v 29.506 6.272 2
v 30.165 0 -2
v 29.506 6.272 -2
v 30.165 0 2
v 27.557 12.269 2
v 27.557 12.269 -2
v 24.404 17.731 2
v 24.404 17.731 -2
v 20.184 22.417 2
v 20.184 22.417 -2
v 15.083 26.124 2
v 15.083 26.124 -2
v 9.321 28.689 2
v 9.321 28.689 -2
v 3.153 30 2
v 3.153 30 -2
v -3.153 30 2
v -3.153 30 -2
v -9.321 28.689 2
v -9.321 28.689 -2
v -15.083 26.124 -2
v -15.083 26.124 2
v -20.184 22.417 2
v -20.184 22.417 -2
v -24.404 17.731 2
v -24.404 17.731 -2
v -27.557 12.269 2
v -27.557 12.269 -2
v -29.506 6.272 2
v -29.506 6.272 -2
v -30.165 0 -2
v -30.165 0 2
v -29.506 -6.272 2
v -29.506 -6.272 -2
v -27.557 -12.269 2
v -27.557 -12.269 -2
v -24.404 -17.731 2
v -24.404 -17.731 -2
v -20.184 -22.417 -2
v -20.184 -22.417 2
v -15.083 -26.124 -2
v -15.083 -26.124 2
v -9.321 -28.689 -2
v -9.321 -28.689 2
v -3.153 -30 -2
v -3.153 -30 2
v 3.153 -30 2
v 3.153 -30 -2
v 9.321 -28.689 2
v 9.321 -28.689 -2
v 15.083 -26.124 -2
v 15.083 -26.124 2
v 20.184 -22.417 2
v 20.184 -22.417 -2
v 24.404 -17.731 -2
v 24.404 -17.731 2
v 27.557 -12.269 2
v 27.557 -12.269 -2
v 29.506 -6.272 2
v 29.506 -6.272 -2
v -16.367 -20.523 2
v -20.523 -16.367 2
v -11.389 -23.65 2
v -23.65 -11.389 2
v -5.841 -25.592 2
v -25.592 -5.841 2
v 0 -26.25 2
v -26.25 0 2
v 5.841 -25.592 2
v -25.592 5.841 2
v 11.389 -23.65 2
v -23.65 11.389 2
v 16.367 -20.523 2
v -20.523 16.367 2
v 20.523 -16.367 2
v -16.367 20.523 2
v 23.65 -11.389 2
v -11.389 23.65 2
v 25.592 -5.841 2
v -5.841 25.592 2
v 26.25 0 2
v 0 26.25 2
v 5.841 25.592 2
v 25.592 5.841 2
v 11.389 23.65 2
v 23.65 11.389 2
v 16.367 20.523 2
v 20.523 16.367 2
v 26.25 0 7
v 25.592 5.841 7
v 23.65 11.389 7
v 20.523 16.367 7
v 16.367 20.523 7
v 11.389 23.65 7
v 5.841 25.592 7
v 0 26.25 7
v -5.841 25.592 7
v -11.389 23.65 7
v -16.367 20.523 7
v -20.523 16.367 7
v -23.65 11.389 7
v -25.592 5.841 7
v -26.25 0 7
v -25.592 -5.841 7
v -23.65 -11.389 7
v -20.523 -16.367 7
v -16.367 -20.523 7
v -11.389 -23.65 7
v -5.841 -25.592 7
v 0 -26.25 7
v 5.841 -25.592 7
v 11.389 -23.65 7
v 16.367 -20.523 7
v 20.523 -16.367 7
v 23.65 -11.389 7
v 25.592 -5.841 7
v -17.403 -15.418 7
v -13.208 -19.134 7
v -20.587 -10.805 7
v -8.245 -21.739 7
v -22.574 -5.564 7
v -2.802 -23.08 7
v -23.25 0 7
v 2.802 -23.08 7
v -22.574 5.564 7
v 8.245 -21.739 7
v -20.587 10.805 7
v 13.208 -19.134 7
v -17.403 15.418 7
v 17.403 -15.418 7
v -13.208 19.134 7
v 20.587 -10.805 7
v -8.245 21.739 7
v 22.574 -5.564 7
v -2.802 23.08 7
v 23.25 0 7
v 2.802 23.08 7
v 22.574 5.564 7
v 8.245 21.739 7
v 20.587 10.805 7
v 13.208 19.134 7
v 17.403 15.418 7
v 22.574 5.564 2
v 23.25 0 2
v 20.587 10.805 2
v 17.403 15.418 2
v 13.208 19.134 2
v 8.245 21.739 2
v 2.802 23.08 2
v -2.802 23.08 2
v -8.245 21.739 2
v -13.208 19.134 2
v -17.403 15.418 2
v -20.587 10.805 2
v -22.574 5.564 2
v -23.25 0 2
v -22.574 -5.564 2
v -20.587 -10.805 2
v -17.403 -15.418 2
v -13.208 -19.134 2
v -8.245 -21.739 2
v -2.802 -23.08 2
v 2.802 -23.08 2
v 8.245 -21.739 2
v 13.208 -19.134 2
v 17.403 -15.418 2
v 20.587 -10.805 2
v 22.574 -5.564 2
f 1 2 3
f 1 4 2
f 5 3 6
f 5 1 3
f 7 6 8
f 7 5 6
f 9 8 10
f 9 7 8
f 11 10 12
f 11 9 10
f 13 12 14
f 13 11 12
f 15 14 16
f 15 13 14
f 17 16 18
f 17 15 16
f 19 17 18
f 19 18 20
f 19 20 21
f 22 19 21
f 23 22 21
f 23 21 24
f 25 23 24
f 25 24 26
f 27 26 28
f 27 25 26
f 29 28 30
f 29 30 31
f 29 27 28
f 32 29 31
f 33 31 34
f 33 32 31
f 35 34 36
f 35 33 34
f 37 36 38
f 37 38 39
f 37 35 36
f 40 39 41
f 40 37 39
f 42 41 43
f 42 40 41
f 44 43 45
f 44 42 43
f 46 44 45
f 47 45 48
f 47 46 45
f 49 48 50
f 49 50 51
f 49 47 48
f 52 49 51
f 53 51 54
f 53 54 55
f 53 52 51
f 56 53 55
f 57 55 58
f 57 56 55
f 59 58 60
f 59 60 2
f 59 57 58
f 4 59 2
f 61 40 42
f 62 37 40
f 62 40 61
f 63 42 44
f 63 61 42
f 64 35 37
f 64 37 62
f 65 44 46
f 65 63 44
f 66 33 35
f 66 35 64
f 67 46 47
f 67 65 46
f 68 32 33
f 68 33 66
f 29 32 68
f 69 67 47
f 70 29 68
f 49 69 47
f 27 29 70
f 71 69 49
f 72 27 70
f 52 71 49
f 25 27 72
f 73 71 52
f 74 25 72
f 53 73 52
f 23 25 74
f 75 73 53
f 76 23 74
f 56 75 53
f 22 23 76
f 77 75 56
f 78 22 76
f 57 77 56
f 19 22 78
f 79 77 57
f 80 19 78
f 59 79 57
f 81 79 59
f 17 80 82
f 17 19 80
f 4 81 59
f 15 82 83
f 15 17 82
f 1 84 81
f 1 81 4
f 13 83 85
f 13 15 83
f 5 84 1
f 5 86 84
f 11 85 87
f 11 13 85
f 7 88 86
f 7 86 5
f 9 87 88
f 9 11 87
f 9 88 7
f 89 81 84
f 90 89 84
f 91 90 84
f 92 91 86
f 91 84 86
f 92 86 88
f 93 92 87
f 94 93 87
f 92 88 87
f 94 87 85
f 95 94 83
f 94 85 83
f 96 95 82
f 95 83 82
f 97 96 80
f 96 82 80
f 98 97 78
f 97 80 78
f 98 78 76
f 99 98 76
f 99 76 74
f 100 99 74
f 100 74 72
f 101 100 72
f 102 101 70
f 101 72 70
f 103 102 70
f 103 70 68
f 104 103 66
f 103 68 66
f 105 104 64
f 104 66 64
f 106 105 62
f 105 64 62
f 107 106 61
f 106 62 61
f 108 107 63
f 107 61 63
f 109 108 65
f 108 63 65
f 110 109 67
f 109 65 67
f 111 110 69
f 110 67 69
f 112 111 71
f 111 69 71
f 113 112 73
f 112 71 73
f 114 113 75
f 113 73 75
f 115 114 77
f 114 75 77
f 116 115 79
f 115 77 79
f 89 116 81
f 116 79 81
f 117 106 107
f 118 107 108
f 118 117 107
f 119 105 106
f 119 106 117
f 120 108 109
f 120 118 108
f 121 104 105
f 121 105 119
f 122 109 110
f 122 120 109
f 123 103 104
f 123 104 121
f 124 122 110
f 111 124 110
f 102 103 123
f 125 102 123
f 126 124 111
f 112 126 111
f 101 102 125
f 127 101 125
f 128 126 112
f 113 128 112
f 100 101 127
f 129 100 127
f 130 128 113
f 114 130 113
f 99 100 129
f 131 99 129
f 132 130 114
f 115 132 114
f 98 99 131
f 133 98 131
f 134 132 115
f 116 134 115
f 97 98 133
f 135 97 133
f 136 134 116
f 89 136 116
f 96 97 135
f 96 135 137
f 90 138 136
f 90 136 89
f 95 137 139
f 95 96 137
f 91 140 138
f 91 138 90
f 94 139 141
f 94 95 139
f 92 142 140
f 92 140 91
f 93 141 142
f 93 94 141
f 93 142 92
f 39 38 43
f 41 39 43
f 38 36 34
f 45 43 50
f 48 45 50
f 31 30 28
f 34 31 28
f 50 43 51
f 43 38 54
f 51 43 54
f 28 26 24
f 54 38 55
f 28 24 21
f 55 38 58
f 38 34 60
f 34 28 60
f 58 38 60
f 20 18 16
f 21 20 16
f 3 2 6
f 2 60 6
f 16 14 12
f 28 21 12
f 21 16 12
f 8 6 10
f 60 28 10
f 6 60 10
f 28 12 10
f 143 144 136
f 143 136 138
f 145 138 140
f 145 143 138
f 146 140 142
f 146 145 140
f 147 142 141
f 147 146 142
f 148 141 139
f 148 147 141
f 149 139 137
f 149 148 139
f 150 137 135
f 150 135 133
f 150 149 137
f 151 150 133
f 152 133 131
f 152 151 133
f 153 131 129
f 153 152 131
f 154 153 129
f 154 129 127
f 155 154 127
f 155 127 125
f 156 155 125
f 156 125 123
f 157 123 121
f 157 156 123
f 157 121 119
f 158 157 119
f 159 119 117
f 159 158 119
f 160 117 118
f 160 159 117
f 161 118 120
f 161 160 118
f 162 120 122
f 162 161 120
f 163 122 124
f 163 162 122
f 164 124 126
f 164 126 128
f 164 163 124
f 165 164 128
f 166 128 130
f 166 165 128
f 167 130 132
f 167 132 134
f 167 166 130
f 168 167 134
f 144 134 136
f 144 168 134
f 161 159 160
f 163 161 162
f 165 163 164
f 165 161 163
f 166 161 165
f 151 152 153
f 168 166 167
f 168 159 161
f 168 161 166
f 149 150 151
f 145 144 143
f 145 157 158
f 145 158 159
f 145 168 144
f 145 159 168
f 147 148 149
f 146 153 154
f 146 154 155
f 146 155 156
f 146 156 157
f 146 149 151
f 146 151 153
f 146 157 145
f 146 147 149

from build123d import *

# Parameters (mm, degrees)
SALIENTE_EXTRUIR1_DEPTH      = 2
SALIENTE_EXTRUIR1_DEPTH_BACK = 2
CROQUIS1_R                   = 30.165
CROQUIS3_R                   = 26.25
CROQUIS3_R_2                 = 23.25
SALIENTE_EXTRUIR2_DEPTH      = 5


with BuildPart() as part:
    # Croquis1 → Saliente-Extruir1 (new, two sides: drawn at the far end of the back side and taken through both)
    with BuildSketch(Plane.XY.offset(-SALIENTE_EXTRUIR1_DEPTH_BACK)):
        Circle(CROQUIS1_R)
    extrude(amount=SALIENTE_EXTRUIR1_DEPTH + SALIENTE_EXTRUIR1_DEPTH_BACK)

    # Croquis3 → Saliente-Extruir2 (add)
    with BuildSketch(Plane.XY.offset(2)):
        Circle(CROQUIS3_R)
        Circle(CROQUIS3_R_2, mode=Mode.SUBTRACT)
    extrude(amount=SALIENTE_EXTRUIR2_DEPTH)


solid = part.part
